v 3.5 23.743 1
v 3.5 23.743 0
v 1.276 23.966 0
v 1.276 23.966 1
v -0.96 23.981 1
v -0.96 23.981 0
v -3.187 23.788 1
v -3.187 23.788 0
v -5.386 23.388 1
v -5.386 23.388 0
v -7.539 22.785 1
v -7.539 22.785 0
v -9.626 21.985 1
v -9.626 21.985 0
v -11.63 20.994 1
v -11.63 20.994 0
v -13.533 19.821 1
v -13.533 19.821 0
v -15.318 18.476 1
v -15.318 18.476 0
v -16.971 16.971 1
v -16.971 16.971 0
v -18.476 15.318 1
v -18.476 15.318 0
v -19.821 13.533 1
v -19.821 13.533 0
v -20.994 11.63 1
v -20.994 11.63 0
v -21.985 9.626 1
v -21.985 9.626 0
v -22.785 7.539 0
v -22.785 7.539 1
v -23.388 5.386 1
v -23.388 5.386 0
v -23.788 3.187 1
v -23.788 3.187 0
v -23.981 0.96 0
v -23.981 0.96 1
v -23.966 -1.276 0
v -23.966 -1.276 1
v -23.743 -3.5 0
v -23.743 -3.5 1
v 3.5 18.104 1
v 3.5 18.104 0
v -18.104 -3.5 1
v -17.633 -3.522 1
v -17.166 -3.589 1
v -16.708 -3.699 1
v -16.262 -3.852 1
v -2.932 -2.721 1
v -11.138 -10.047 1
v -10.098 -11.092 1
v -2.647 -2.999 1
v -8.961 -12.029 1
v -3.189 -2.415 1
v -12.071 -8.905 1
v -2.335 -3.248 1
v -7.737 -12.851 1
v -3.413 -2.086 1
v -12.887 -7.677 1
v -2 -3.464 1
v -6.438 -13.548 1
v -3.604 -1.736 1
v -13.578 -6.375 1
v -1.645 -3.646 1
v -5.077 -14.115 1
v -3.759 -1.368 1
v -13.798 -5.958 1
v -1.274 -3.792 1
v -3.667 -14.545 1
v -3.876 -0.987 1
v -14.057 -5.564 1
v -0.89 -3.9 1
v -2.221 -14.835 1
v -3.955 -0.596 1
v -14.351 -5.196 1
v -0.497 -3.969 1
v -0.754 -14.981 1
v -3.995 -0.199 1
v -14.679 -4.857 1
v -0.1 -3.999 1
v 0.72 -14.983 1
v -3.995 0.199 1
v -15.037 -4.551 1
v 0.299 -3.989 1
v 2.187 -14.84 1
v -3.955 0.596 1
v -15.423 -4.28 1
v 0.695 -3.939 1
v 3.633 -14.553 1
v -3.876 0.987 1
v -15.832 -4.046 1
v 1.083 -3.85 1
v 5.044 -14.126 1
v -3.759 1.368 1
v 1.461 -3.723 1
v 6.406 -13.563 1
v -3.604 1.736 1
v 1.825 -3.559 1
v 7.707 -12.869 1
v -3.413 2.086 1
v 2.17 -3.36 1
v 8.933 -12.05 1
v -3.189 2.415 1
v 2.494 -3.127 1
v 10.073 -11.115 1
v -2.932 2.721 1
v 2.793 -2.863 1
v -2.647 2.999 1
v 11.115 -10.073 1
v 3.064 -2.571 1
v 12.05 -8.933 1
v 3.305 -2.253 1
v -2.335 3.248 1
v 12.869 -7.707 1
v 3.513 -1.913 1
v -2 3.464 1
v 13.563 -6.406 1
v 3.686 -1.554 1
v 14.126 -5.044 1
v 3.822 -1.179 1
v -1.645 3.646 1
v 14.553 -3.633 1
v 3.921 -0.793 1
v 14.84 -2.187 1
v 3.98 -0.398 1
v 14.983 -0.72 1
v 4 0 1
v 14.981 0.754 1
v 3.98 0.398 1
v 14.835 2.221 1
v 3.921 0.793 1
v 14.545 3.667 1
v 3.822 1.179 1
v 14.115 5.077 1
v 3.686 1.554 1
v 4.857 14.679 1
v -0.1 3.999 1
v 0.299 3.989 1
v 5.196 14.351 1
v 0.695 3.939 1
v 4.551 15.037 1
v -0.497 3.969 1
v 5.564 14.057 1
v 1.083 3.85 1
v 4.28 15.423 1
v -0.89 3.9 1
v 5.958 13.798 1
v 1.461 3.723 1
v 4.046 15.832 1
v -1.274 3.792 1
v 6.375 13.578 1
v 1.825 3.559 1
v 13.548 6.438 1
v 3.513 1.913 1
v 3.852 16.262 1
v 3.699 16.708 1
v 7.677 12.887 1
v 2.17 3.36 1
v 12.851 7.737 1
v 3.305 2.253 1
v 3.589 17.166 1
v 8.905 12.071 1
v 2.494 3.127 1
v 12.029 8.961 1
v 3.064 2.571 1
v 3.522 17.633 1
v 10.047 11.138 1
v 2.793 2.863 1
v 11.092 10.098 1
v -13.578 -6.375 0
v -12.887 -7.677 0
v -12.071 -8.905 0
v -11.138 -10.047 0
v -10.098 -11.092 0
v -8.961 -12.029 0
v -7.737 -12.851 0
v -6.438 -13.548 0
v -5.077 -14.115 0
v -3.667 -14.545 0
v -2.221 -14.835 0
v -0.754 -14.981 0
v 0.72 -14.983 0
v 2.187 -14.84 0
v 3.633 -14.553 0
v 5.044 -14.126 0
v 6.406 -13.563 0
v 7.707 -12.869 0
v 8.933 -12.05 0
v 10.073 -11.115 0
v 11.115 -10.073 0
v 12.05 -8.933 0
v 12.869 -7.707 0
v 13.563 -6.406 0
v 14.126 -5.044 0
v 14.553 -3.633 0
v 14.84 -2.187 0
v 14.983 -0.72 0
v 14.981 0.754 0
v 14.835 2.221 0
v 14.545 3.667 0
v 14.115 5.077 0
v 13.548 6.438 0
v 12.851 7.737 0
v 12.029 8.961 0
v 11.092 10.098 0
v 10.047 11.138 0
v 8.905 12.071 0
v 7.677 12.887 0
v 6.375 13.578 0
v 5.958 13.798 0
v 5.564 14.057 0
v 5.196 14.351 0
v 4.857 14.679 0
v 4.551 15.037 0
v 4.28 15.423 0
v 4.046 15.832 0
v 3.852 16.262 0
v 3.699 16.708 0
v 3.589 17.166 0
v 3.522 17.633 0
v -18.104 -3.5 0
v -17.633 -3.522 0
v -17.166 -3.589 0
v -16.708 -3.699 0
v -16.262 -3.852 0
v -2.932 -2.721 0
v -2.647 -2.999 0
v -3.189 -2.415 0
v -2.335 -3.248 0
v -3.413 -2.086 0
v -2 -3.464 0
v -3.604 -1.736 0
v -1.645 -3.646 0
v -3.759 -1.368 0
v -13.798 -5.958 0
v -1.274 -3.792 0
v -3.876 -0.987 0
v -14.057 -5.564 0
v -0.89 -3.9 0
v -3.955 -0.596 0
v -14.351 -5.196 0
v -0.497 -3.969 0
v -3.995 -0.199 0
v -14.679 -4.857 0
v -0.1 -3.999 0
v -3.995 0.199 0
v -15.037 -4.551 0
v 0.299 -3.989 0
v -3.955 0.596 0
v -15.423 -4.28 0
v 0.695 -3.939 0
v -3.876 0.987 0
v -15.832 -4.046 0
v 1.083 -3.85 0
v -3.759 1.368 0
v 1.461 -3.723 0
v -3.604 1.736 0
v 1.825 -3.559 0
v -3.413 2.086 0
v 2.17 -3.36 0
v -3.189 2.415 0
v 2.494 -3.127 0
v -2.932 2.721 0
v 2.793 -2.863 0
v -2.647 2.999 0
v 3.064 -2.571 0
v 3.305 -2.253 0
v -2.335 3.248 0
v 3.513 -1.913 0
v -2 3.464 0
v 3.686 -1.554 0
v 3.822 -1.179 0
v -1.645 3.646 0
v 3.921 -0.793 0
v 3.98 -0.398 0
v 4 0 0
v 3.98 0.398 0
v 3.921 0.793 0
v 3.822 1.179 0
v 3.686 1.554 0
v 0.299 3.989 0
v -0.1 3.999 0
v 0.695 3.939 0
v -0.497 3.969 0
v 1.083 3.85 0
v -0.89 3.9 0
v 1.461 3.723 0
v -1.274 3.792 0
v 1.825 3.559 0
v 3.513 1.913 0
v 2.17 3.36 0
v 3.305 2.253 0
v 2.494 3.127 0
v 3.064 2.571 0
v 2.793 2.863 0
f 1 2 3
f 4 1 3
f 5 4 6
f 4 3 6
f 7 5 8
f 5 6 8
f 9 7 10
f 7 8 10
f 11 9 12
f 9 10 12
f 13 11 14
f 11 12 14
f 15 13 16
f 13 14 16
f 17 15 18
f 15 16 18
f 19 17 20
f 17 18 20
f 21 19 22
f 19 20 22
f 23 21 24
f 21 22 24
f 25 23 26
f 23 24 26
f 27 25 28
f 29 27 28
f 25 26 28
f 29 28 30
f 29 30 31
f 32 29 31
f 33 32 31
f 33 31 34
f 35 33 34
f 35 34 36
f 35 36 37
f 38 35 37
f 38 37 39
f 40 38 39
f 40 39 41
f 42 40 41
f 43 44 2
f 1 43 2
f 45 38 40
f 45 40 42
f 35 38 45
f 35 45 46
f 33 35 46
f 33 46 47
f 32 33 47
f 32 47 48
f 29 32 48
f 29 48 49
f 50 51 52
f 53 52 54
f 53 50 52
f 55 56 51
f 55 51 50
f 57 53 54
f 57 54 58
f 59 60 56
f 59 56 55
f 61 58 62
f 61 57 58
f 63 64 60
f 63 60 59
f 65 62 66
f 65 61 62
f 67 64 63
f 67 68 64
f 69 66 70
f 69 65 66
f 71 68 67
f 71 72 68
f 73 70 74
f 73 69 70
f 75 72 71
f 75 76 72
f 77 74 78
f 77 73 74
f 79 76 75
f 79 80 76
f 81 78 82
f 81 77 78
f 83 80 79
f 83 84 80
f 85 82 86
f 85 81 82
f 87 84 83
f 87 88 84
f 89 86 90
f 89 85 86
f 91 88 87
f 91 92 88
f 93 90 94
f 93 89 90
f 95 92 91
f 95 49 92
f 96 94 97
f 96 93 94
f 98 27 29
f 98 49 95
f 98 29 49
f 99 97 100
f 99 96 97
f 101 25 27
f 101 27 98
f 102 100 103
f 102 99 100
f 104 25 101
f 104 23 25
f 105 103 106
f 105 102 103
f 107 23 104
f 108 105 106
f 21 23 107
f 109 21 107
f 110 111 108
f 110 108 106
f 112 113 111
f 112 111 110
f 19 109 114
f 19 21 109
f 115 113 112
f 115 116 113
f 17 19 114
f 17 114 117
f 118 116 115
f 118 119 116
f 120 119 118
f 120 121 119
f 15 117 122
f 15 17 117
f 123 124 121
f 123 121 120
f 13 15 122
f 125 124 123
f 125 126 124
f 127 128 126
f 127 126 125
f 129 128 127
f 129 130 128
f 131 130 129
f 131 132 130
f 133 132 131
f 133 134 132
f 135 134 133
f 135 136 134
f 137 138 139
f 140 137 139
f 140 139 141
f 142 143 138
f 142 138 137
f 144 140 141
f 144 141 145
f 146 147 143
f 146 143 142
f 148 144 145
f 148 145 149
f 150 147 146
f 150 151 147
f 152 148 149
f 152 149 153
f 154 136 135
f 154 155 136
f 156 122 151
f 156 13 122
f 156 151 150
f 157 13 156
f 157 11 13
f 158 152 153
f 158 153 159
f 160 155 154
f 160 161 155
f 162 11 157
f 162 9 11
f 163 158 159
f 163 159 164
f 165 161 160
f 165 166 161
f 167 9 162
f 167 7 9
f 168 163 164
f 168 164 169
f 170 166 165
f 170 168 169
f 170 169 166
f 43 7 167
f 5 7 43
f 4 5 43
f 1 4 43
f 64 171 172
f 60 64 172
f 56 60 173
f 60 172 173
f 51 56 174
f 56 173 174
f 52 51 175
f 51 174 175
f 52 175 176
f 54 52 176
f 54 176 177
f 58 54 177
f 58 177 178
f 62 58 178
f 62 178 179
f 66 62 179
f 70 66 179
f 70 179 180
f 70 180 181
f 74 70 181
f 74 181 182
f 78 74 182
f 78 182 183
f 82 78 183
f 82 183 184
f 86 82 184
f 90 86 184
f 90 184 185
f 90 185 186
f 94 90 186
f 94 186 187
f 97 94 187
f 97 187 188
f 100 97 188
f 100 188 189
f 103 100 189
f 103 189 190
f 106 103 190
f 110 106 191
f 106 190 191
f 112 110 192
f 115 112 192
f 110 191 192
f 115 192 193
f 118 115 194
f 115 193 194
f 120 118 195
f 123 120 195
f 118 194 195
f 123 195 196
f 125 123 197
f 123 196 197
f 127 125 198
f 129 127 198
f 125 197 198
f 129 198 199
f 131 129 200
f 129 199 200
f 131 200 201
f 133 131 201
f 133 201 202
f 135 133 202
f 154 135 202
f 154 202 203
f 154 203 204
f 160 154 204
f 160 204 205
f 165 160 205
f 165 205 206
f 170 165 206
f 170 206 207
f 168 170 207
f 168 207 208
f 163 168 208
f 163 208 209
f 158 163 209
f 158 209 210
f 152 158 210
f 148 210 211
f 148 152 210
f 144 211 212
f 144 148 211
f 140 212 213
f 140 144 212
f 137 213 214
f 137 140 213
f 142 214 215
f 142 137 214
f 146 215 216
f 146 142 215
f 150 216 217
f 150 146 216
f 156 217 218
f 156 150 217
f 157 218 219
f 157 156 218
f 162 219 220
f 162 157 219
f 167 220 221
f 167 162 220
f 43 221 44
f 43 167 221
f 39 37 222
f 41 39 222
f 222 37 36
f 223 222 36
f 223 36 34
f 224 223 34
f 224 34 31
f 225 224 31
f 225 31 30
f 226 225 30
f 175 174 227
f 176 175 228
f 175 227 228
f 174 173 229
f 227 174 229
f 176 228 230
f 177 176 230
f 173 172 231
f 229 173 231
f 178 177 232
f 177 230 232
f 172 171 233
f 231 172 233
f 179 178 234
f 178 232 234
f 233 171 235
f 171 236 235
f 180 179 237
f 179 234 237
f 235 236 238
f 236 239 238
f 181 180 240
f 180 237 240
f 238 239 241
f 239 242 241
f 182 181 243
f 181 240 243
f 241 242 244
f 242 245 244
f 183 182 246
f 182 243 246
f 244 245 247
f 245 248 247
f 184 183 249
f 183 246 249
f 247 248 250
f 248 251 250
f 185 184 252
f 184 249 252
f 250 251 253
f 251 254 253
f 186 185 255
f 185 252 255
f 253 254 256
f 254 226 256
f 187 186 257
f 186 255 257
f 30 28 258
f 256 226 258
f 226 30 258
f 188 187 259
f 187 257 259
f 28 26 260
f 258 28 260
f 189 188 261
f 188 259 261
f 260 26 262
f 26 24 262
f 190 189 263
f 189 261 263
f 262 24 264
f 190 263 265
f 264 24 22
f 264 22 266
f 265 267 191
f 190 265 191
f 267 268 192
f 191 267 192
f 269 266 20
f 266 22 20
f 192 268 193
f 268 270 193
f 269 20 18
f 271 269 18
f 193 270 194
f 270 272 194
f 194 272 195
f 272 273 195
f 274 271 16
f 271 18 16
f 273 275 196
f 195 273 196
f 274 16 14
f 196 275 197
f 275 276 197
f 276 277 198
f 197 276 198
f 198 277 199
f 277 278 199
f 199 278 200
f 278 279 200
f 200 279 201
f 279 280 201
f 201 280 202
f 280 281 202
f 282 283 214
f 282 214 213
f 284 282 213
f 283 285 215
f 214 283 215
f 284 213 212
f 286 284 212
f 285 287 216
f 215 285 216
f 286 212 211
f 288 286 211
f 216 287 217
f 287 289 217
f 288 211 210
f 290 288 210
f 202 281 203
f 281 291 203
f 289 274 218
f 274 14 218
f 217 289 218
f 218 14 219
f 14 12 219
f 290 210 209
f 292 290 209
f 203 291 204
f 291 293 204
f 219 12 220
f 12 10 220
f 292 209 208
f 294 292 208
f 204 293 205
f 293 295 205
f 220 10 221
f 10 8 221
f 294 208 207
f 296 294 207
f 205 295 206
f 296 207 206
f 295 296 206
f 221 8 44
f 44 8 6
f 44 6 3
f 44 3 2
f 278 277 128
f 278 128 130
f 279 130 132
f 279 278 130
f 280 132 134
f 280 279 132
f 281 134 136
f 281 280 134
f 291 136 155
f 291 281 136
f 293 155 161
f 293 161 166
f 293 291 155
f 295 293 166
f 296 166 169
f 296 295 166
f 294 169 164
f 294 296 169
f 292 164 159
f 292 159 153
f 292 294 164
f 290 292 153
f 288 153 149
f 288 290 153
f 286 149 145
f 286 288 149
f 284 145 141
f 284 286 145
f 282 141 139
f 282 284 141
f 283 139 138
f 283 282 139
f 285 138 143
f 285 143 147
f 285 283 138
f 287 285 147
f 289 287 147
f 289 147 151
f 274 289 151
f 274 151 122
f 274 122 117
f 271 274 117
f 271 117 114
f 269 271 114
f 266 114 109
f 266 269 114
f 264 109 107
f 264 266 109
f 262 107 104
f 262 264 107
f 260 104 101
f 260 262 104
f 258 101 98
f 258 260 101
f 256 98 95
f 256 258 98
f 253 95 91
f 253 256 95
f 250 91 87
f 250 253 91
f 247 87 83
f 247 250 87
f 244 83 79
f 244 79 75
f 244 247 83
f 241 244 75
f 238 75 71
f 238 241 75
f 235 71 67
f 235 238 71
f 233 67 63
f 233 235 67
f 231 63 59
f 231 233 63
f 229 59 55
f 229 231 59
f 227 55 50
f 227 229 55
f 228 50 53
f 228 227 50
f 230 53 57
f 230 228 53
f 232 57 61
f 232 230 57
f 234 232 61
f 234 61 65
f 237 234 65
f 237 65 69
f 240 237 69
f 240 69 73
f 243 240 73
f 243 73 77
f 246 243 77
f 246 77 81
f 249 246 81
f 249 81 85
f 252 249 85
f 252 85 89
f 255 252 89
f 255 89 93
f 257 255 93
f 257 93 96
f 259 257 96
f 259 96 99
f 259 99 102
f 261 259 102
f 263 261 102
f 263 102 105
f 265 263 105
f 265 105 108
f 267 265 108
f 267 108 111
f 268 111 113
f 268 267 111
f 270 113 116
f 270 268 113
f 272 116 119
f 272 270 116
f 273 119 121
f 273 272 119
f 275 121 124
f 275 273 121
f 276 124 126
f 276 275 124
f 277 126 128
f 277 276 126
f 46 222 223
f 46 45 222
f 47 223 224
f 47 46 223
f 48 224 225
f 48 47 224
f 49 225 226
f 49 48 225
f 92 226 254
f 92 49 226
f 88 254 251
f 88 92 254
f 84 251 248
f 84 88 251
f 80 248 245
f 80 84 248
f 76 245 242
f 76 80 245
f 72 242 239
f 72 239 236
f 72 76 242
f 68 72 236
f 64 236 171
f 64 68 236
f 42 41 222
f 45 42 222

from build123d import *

# Parameters (mm, degrees)
SKETCH_1_R          = 24
EXTRUDE_1_DEPTH     = 1
CUT_EXTRUDE_START   = -1
SKETCH_2_R          = 4
CUT_EXTRUDE_1_DEPTH = 1
FILLET_1_R          = 5
FILLET_2_R          = 5


with BuildPart() as part:
    # 草图1 → 拉伸1 (new body)
    with BuildSketch(Plane.XY):
        Circle(SKETCH_1_R)
    extrude(amount=EXTRUDE_1_DEPTH)

    # 草图2 → 切除-拉伸1 (cut)
    with BuildSketch(Plane.XY.offset(1).offset(CUT_EXTRUDE_START)):
        Circle(SKETCH_2_R)
        with BuildLine():
            Line((-23.743420141, -3.5), (-14.585952146, -3.5))
            ThreePointArc((-14.585952146, -3.5), (10.606601718, -10.606601718), (3.5, 14.585952146))
            Line((3.5, 14.585952146), (3.5, 23.743420141))
            ThreePointArc((3.5, 23.743420141), (16.970562748, -16.970562748), (-23.743420141, -3.5))
        make_face()
    extrude(amount=CUT_EXTRUDE_1_DEPTH, mode=Mode.SUBTRACT)

    # 圆角1
    fillet_1_edges = [part.edges().sort_by_distance(p)[0] for p in [
        (-14.585952146, -3.5, 0.5),
    ]]
    fillet(fillet_1_edges, radius=FILLET_1_R)

    # 圆角2
    fillet_2_edges = [part.edges().sort_by_distance(p)[0] for p in [
        (3.5, 14.585952146, 0.5),
    ]]
    fillet(fillet_2_edges, radius=FILLET_2_R)


solid = part.part
